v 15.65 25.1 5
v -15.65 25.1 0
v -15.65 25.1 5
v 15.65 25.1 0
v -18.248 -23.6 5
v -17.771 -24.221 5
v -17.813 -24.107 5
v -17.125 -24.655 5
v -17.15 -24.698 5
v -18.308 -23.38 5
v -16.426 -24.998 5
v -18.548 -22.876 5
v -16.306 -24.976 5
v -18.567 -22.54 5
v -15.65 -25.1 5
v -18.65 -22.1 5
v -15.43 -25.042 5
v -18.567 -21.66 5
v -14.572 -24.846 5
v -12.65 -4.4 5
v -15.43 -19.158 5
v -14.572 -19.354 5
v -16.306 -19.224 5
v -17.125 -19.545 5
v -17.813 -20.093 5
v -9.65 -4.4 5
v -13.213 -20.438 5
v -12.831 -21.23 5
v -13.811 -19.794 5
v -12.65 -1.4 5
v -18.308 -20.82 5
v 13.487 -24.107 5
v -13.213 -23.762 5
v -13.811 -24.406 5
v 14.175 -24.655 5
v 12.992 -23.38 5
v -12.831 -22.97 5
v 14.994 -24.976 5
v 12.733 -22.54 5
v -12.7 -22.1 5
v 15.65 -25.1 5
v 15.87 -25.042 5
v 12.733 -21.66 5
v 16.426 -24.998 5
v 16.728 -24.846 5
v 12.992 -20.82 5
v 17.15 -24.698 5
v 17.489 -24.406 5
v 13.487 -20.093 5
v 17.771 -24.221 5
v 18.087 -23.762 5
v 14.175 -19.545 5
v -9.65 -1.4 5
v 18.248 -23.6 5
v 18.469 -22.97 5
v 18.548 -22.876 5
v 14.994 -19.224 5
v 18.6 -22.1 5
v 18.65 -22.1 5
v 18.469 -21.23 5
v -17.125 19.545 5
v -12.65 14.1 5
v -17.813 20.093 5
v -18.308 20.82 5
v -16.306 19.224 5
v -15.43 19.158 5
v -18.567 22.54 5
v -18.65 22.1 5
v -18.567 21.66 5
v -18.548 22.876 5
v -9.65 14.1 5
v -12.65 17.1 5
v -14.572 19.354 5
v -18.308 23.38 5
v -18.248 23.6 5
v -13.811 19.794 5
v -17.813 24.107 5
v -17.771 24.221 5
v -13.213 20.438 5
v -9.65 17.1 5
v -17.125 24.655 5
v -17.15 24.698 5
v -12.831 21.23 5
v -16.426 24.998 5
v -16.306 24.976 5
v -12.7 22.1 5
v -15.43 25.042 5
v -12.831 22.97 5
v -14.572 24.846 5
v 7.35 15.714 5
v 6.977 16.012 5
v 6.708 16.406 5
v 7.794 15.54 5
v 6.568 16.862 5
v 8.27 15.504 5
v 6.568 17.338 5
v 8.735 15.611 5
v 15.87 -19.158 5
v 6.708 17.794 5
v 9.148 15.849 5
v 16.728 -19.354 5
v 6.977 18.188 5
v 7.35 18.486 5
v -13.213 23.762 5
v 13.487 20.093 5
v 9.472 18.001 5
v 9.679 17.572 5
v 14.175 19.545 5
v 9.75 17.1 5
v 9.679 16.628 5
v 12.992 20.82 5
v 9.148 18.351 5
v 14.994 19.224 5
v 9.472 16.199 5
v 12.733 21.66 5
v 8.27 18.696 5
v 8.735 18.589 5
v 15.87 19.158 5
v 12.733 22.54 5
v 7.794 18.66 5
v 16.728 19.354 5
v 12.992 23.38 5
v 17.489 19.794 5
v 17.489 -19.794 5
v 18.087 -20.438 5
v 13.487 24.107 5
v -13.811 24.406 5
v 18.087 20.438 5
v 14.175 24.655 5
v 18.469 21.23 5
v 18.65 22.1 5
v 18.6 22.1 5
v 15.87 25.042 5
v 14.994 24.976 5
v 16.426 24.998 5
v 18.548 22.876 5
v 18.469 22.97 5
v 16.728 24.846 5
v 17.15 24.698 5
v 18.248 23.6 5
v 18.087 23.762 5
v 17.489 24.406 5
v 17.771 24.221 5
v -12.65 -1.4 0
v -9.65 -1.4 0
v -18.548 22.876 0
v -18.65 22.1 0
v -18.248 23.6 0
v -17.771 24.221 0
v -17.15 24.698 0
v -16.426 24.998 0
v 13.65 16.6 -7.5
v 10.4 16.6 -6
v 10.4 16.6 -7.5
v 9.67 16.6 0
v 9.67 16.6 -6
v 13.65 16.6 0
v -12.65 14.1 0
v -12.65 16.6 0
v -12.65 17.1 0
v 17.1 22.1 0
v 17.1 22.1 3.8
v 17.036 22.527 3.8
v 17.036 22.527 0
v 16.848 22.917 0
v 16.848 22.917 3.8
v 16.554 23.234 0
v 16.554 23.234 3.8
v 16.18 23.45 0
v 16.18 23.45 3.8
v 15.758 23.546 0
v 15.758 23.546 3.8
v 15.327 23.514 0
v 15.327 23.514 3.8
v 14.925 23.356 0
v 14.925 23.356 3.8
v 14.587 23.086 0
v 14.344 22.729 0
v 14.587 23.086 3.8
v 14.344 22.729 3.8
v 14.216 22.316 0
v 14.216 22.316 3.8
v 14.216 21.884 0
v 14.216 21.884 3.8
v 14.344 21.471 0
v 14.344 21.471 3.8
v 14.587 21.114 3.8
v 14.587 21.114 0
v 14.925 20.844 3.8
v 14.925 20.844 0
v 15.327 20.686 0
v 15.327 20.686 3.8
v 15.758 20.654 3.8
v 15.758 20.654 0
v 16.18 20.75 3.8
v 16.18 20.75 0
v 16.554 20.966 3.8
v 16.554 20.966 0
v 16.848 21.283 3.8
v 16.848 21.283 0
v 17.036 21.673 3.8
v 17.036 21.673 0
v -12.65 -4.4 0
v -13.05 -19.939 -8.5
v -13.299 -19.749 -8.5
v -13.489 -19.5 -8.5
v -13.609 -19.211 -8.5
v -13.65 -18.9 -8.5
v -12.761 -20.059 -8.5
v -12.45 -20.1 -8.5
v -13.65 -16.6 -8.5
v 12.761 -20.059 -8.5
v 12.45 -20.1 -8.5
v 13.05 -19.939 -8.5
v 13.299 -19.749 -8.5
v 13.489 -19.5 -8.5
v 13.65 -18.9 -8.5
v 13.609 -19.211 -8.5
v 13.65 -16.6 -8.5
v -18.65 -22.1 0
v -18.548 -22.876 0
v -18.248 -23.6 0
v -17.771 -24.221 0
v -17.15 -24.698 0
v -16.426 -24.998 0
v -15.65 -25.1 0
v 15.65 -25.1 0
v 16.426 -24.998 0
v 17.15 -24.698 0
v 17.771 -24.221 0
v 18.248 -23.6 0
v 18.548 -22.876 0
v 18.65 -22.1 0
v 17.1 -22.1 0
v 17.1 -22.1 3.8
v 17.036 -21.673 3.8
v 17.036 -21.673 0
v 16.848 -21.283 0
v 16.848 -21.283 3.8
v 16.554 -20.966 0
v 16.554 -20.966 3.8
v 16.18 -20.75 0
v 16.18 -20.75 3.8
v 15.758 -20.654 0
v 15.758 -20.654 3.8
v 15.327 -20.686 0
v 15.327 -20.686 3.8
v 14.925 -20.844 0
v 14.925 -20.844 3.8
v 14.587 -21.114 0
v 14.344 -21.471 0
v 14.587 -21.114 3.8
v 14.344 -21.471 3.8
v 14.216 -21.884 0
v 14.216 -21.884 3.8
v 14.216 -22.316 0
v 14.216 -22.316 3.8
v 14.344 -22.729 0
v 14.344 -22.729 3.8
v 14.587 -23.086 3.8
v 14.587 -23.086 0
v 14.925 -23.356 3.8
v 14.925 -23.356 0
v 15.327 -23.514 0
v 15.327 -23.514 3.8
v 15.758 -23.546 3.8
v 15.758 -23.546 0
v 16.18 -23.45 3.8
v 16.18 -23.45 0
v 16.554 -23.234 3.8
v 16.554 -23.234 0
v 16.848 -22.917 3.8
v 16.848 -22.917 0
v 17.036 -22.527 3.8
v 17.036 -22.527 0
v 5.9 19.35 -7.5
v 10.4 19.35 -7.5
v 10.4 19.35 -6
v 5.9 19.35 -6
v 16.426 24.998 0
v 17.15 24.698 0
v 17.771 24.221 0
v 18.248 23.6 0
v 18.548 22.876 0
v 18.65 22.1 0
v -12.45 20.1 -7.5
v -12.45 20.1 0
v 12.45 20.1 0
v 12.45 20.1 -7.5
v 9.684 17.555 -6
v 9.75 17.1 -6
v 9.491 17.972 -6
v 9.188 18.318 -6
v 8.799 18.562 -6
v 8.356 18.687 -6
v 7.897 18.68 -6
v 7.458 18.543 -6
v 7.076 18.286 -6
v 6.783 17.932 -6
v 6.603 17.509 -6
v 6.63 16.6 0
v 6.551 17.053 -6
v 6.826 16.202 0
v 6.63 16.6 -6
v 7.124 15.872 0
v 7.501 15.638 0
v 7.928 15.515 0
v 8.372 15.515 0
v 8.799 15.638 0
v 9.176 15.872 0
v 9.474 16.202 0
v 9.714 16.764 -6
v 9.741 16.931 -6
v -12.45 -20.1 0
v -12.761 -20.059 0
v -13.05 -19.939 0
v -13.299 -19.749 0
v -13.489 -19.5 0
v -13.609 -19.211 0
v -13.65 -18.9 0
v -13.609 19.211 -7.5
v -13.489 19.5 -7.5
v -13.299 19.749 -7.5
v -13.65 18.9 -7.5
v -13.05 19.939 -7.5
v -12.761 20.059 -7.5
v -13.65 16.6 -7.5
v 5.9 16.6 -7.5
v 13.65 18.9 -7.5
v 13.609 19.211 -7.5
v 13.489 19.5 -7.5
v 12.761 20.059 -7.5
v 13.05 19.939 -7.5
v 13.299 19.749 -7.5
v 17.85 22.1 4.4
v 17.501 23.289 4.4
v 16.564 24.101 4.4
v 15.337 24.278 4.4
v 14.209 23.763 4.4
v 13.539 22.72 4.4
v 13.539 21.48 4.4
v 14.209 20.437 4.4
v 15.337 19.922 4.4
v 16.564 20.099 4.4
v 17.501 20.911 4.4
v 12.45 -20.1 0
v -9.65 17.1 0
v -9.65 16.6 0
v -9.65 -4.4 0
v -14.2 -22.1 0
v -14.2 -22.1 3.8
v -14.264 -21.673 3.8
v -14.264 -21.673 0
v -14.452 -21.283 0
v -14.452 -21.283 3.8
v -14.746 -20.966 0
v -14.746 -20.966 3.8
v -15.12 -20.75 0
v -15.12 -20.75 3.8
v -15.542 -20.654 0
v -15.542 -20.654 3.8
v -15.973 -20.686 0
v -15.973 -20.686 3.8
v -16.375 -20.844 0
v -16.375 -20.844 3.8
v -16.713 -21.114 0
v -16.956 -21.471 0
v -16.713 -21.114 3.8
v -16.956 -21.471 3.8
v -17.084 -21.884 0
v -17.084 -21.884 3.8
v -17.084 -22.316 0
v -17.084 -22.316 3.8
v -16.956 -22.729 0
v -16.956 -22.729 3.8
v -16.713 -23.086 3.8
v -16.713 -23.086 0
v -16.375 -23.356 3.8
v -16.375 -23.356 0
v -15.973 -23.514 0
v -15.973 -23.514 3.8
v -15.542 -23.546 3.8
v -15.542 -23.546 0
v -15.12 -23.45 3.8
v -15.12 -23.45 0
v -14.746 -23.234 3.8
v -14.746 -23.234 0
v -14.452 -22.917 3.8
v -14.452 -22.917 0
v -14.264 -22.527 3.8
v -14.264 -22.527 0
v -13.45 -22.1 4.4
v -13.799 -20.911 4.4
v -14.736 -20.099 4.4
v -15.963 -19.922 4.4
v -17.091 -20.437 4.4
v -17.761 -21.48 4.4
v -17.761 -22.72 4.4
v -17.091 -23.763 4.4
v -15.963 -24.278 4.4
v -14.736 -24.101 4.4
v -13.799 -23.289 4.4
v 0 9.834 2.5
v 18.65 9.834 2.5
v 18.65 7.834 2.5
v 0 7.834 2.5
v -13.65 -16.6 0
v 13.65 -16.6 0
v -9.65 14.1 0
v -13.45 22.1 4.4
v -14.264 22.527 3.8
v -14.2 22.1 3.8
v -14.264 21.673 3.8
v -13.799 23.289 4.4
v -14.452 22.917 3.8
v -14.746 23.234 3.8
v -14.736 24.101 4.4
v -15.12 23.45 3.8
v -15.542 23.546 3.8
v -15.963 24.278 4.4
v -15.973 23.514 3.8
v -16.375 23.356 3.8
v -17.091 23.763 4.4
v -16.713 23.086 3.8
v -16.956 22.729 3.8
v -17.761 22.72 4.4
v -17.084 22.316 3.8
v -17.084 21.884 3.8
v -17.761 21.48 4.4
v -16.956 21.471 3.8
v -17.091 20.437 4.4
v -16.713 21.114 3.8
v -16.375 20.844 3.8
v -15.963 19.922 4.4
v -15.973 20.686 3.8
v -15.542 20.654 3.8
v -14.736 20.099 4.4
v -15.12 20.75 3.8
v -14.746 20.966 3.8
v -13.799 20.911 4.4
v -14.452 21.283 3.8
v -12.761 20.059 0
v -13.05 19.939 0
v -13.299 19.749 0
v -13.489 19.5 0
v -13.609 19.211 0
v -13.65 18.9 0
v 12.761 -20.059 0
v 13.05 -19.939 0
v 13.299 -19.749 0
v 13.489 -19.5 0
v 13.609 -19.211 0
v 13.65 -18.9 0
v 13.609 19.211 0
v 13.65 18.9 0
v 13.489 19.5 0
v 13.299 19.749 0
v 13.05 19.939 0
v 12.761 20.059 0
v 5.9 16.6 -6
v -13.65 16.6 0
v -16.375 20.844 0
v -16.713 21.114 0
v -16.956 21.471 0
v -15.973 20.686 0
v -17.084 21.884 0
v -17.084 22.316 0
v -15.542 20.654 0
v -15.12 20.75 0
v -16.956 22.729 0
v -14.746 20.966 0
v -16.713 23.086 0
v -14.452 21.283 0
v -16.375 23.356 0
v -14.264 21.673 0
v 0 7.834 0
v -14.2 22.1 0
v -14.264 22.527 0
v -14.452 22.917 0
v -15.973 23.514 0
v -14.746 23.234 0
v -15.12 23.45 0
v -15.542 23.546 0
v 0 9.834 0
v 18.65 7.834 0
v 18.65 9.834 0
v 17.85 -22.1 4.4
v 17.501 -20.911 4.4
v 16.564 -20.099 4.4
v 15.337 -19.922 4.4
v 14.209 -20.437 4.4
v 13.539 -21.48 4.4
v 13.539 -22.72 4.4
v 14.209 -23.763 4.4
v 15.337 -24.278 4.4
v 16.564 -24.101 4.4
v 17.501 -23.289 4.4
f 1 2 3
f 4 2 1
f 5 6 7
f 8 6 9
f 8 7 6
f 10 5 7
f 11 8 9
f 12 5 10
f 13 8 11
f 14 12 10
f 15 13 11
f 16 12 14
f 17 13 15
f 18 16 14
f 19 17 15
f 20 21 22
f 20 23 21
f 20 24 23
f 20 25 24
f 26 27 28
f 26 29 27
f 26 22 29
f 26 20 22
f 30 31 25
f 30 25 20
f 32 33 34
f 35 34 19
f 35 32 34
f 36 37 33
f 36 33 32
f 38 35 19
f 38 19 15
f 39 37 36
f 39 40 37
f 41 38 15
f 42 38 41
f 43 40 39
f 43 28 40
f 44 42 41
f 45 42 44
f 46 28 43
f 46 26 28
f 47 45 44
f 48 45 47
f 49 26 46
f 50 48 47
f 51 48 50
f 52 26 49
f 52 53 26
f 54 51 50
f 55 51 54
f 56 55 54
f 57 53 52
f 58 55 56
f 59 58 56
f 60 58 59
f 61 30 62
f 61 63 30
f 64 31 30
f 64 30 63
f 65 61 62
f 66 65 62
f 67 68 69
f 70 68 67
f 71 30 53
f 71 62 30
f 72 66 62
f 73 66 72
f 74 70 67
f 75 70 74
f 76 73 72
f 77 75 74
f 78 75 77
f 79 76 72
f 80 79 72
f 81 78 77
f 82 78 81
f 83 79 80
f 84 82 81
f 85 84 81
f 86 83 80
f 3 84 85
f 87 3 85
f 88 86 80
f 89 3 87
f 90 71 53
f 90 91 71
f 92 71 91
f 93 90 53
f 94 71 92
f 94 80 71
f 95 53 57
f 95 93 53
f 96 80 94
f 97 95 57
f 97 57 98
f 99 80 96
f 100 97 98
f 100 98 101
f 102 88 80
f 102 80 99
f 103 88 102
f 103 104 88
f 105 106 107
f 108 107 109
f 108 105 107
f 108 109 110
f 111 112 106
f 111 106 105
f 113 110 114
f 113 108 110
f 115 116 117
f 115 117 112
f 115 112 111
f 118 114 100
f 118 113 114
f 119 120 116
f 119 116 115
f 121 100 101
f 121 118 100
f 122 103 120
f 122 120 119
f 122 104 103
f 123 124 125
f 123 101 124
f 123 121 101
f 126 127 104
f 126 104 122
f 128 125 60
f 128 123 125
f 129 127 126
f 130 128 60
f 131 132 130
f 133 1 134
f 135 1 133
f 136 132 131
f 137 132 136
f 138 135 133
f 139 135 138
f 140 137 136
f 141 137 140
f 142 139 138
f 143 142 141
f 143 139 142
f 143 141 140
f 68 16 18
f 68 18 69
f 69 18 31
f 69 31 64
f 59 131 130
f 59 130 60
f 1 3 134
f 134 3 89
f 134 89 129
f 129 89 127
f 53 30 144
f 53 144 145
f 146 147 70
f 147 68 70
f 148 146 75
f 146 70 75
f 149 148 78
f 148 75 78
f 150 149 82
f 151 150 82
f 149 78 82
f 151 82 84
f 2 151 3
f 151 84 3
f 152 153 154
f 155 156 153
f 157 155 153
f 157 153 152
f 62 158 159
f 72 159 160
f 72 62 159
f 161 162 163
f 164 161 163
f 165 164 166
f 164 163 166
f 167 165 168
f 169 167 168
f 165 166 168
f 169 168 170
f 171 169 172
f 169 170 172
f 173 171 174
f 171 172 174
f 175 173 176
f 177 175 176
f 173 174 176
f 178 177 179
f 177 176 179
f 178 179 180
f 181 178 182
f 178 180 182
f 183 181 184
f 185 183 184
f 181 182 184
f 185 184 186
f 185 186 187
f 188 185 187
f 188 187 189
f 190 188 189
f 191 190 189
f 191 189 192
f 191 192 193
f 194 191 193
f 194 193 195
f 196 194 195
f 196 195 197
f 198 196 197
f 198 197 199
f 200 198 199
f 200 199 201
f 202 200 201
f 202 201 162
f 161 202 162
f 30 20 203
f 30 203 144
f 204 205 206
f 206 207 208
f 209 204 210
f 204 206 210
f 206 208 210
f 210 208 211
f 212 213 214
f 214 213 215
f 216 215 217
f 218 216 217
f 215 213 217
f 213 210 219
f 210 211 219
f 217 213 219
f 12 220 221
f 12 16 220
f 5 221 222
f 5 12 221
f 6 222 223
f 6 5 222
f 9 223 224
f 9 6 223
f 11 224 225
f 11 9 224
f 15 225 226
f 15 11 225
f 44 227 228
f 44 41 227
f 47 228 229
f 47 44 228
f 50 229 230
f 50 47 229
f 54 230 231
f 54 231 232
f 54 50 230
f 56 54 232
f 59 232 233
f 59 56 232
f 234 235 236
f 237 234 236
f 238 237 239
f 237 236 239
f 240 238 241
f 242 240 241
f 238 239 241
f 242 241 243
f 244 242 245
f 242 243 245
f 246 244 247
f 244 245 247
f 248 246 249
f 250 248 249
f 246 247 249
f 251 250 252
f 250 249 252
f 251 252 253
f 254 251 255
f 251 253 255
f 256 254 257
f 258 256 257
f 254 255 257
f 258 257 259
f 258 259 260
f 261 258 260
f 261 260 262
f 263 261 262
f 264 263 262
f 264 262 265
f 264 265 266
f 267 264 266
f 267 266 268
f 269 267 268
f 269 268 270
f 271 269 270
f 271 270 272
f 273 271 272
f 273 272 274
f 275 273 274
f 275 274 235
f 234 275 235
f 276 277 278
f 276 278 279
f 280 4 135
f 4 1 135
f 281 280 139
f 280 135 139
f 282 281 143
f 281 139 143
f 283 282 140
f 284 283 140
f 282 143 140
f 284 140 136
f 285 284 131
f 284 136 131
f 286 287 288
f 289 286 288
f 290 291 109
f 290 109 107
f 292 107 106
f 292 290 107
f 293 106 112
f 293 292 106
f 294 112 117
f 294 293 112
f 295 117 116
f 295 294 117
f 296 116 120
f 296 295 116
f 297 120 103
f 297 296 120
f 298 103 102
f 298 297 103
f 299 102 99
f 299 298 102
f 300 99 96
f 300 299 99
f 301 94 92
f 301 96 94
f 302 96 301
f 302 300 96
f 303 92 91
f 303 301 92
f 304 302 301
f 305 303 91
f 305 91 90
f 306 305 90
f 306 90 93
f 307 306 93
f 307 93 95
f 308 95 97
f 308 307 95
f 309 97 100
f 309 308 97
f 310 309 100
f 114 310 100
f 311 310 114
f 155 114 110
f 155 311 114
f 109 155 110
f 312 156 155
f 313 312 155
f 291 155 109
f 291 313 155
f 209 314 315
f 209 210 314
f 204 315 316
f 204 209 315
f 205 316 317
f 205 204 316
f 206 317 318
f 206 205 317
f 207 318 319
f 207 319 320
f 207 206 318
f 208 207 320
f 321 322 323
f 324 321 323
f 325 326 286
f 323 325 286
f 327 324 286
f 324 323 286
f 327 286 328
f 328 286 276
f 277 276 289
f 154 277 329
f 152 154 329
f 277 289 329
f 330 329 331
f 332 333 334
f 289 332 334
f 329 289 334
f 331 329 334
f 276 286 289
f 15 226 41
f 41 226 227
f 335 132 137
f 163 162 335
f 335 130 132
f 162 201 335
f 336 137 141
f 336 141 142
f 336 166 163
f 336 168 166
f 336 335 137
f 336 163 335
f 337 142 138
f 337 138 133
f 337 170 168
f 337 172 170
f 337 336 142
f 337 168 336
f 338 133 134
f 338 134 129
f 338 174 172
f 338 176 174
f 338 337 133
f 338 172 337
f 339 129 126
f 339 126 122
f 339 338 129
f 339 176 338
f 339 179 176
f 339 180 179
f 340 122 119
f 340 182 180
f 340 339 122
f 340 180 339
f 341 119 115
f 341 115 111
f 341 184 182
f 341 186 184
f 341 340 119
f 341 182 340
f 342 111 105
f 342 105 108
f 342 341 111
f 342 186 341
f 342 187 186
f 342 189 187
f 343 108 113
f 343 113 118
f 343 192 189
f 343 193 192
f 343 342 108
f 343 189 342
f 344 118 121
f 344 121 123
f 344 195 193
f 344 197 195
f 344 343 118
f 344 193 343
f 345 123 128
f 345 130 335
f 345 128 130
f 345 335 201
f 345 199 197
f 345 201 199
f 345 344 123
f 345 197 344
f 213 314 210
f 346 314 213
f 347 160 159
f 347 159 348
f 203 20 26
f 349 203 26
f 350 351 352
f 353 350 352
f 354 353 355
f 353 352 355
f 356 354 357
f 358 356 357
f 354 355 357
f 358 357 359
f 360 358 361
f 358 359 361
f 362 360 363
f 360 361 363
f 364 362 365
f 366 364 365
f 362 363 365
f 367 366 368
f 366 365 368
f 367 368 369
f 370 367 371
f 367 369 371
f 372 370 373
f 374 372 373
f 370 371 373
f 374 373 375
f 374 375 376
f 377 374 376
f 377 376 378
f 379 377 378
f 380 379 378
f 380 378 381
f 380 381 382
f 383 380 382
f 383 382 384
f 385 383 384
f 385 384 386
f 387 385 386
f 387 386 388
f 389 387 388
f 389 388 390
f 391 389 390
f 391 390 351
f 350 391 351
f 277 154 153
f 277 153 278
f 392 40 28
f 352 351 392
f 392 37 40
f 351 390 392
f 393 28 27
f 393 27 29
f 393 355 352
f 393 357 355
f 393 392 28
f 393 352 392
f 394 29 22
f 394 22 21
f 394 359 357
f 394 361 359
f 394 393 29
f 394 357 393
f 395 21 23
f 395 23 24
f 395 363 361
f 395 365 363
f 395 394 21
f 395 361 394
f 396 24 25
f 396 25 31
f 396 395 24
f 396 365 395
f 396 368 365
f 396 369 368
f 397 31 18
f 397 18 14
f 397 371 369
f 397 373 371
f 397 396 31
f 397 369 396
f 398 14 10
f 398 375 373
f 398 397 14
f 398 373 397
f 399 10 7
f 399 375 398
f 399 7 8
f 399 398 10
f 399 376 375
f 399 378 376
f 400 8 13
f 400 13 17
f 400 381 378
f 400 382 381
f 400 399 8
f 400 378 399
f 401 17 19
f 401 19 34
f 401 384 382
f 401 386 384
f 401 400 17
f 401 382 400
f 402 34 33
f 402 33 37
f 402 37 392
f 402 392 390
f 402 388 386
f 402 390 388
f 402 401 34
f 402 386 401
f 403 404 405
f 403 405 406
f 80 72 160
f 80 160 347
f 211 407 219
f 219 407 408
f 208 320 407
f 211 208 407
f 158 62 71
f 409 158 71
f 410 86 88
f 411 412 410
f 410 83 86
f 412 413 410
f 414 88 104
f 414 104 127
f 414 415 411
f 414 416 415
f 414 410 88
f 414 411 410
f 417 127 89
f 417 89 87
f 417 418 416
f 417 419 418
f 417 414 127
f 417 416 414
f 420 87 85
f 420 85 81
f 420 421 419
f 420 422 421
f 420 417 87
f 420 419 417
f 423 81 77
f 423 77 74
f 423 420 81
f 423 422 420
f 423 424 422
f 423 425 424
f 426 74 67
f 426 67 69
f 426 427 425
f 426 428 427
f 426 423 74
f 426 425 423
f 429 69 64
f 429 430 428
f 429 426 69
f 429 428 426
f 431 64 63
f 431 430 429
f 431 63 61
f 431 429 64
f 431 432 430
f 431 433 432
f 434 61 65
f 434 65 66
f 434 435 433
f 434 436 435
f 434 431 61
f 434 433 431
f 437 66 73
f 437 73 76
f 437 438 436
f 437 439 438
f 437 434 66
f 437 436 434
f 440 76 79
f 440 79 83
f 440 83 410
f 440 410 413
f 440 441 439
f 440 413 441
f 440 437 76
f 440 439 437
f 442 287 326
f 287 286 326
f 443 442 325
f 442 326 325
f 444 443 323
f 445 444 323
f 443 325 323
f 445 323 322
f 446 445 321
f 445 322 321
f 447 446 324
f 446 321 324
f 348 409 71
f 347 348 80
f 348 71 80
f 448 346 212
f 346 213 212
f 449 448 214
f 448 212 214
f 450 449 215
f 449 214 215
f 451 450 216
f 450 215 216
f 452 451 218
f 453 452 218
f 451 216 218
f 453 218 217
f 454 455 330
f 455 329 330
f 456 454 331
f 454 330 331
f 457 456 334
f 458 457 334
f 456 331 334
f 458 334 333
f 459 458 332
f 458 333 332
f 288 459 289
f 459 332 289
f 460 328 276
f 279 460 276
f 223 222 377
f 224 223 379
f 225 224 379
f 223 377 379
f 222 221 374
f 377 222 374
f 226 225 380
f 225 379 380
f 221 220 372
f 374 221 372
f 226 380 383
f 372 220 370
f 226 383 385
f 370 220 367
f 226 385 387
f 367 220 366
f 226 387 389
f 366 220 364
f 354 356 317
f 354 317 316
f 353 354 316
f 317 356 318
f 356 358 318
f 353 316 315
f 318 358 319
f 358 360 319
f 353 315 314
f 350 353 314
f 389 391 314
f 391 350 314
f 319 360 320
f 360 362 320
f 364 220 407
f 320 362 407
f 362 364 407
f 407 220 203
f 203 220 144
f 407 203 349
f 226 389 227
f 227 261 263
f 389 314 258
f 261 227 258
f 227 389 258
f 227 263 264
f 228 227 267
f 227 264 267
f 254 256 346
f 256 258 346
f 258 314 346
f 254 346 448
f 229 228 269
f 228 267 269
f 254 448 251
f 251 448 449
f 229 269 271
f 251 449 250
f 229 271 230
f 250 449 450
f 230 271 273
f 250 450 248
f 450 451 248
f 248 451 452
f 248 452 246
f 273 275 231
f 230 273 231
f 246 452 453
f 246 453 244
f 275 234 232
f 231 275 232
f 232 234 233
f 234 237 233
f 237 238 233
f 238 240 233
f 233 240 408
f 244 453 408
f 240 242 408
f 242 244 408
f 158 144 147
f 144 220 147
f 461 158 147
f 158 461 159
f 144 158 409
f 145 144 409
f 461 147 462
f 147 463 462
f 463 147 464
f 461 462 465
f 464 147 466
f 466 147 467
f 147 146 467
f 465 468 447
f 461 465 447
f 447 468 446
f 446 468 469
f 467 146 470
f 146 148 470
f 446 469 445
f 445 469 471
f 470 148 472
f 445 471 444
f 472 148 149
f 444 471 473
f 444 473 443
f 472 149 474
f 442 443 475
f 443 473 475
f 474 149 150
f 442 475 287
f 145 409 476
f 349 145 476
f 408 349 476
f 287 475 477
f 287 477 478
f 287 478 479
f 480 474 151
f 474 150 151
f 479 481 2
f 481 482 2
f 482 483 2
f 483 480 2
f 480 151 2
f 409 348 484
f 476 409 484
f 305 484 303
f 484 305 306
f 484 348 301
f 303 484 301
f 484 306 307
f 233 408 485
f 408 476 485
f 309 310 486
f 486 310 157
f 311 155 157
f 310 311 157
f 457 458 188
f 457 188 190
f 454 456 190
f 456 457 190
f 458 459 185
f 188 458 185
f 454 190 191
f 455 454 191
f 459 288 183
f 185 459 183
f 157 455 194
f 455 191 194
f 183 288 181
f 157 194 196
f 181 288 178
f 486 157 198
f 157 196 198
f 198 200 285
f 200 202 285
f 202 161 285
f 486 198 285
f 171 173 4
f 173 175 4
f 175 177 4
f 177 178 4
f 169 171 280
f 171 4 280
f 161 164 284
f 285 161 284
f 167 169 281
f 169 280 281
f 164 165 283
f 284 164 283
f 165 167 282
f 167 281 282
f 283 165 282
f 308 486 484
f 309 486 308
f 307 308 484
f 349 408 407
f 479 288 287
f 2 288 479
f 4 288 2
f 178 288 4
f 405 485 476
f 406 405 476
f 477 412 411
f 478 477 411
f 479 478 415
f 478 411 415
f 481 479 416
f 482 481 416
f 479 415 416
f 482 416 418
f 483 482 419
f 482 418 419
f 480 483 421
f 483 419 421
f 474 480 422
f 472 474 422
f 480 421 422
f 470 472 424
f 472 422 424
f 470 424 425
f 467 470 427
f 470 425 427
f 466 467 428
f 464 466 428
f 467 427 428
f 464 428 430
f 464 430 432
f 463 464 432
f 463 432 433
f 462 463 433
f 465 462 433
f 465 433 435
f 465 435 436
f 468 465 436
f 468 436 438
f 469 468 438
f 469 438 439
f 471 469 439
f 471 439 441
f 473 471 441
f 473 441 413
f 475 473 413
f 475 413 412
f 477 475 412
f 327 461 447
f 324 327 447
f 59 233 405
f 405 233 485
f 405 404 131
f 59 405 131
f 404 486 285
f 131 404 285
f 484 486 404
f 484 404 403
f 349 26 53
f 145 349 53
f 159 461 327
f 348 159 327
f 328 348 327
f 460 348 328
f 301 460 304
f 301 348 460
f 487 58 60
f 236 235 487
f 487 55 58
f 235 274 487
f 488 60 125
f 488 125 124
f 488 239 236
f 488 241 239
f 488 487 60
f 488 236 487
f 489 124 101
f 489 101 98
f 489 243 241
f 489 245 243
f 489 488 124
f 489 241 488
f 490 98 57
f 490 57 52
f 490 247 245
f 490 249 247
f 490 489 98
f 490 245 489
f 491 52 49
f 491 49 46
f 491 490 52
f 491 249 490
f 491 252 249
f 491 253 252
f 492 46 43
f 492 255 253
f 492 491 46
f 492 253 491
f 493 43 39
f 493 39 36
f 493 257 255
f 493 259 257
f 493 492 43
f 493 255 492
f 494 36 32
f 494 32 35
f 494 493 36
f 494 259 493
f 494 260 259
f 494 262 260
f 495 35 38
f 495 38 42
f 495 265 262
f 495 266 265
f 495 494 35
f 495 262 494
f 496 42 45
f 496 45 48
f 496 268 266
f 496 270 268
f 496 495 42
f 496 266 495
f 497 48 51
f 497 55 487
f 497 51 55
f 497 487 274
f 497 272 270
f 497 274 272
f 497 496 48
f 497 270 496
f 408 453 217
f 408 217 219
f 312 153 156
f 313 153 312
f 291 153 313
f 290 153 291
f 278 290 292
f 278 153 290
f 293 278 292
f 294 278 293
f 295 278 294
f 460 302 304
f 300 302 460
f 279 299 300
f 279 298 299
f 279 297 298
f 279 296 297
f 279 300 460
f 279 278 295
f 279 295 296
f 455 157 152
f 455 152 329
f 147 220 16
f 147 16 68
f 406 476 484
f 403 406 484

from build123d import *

# Parameters (mm, degrees)
SKETCH_1_W               = 37.3
SKETCH_1_H               = 50.2
EXTRUDE_1_DEPTH          = 5
SKETCH_2_W               = 27.3
SKETCH_2_H               = 3.5
EXTRUDE_2_DEPTH          = 8.5
SKETCH_2_3_W             = 27.3
SKETCH_2_3_H             = 3.5
EXTRUDE_3_DEPTH          = 7.5
FILLET_1_R               = 1.2
FILLET_2_R               = 3
CUT_EXTRUDE_1_DEPTH      = 35.059983852
CUT_EXTRUDE_1_DEPTH_BACK = 35.059983852
SKETCH_4_R               = 1.6
SKETCH_5_W               = 4.5
SKETCH_5_H               = 4.5
CUT_EXTRUDE_2_DEPTH      = 1.5
SKETCH_6_R               = 1.45
CUT_EXTRUDE_3_DEPTH      = 35.059983852
CHAMFER_1_SIZE           = 1.5
CHAMFER_1_SIZE2          = 1.2
SKETCH_8_W               = 3
SKETCH_8_H               = 3
CUT_EXTRUDE_4_DEPTH      = 5
SKETCH_9_W               = 20.033877817
SKETCH_9_H               = 2
CUT_EXTRUDE_5_DEPTH      = 10


with BuildPart() as part:
    # 스케치1 → 보스-돌출1 (new body)
    with BuildSketch(Plane.XY):
        Rectangle(SKETCH_1_W, SKETCH_1_H)
    extrude(amount=EXTRUDE_1_DEPTH)

    # 스케치2 → 보스-돌출2 (add)
    with BuildSketch(Plane.XY):
        with Locations((0, -18.35)):
            Rectangle(SKETCH_2_W, SKETCH_2_H)
    extrude(amount=-EXTRUDE_2_DEPTH)

    # 스케치2<3> → 보스-돌출3 (add)
    with BuildSketch(Plane.XY):
        with Locations((0, 18.35)):
            Rectangle(SKETCH_2_3_W, SKETCH_2_3_H)
    extrude(amount=-EXTRUDE_3_DEPTH)

    # 필렛1
    fillet_1_edges = [part.edges().sort_by_distance(p)[0] for p in [
        (13.65, -20.1, -4.25),
        (-13.65, -20.1, -4.25),
        (-13.65, 20.1, -3.75),
        (13.65, 20.1, -3.75),
    ]]
    fillet(fillet_1_edges, radius=FILLET_1_R)

    # 필렛2
    fillet_2_edges = [part.edges().sort_by_distance(p)[0] for p in [
        (18.65, -25.1, 2.5),
        (-18.65, -25.1, 2.5),
        (-18.65, 25.1, 2.5),
        (18.65, 25.1, 2.5),
    ]]
    fillet(fillet_2_edges, radius=FILLET_2_R)

    # 스케치4 → 컷-돌출1 (cut, two sides: drawn at the far end of the back side and taken through both)
    with BuildSketch(Plane.XY.offset(5).offset(-CUT_EXTRUDE_1_DEPTH_BACK)):
        with Locations((8.15, 17.1)):
            Circle(SKETCH_4_R)
    extrude(amount=CUT_EXTRUDE_1_DEPTH + CUT_EXTRUDE_1_DEPTH_BACK, mode=Mode.SUBTRACT)

    # 스케치5 → 컷-돌출2 (cut)
    with BuildSketch(Plane(origin=(0, 0, -7.5), x_dir=(-1, 0, 0), z_dir=(0, 0, -1))):
        with Locations((-8.15, 17.1)):
            Rectangle(SKETCH_5_W, SKETCH_5_H)
    extrude(amount=-CUT_EXTRUDE_2_DEPTH, mode=Mode.SUBTRACT)

    # 스케치6 → 컷-돌출3 (cut, through all)
    with BuildSketch(Plane.XY.offset(5)):
        with Locations((-15.65, 22.1)):
            Circle(SKETCH_6_R)
        with Locations((15.65, 22.1)):
            Circle(SKETCH_6_R)
        with Locations((15.65, -22.1)):
            Circle(SKETCH_6_R)
        with Locations((-15.65, -22.1)):
            Circle(SKETCH_6_R)
    extrude(amount=-CUT_EXTRUDE_3_DEPTH, mode=Mode.SUBTRACT)

    # 모따기1
    chamfer_1_edges = [part.edges().sort_by_distance(p)[0] for p in [
        (-17.1, -22.1, 5),
        (14.2, -22.1, 5),
        (14.2, 22.1, 5),
        (-17.1, 22.1, 5),
    ]]
    chamfer_1_side = [part.faces().sort_by_distance(p)[0] for p in [
        (-0.035812285, -0.075139887, 5),
    ]]
    chamfer(chamfer_1_edges, length=CHAMFER_1_SIZE, length2=CHAMFER_1_SIZE2, reference=chamfer_1_side[0])

    # 스케치8 → 컷-돌출4 (cut)
    with BuildSketch(Plane.XY.offset(5)):
        with Locations((-11.15, 15.6)):
            Rectangle(SKETCH_8_W, SKETCH_8_H)
        with Locations((-11.15, -2.9)):
            Rectangle(SKETCH_8_W, SKETCH_8_H)
    extrude(amount=-CUT_EXTRUDE_4_DEPTH, mode=Mode.SUBTRACT)

    # 스케치9 → 컷-돌출5 (cut)
    with BuildSketch(Plane(origin=(0, 0, -7.5), x_dir=(-1, 0, 0), z_dir=(0, 0, -1))):
        with Locations((-10.016938909, 8.833508823)):
            Rectangle(SKETCH_9_W, SKETCH_9_H)
    extrude(amount=-CUT_EXTRUDE_5_DEPTH, mode=Mode.SUBTRACT)


solid = part.part
